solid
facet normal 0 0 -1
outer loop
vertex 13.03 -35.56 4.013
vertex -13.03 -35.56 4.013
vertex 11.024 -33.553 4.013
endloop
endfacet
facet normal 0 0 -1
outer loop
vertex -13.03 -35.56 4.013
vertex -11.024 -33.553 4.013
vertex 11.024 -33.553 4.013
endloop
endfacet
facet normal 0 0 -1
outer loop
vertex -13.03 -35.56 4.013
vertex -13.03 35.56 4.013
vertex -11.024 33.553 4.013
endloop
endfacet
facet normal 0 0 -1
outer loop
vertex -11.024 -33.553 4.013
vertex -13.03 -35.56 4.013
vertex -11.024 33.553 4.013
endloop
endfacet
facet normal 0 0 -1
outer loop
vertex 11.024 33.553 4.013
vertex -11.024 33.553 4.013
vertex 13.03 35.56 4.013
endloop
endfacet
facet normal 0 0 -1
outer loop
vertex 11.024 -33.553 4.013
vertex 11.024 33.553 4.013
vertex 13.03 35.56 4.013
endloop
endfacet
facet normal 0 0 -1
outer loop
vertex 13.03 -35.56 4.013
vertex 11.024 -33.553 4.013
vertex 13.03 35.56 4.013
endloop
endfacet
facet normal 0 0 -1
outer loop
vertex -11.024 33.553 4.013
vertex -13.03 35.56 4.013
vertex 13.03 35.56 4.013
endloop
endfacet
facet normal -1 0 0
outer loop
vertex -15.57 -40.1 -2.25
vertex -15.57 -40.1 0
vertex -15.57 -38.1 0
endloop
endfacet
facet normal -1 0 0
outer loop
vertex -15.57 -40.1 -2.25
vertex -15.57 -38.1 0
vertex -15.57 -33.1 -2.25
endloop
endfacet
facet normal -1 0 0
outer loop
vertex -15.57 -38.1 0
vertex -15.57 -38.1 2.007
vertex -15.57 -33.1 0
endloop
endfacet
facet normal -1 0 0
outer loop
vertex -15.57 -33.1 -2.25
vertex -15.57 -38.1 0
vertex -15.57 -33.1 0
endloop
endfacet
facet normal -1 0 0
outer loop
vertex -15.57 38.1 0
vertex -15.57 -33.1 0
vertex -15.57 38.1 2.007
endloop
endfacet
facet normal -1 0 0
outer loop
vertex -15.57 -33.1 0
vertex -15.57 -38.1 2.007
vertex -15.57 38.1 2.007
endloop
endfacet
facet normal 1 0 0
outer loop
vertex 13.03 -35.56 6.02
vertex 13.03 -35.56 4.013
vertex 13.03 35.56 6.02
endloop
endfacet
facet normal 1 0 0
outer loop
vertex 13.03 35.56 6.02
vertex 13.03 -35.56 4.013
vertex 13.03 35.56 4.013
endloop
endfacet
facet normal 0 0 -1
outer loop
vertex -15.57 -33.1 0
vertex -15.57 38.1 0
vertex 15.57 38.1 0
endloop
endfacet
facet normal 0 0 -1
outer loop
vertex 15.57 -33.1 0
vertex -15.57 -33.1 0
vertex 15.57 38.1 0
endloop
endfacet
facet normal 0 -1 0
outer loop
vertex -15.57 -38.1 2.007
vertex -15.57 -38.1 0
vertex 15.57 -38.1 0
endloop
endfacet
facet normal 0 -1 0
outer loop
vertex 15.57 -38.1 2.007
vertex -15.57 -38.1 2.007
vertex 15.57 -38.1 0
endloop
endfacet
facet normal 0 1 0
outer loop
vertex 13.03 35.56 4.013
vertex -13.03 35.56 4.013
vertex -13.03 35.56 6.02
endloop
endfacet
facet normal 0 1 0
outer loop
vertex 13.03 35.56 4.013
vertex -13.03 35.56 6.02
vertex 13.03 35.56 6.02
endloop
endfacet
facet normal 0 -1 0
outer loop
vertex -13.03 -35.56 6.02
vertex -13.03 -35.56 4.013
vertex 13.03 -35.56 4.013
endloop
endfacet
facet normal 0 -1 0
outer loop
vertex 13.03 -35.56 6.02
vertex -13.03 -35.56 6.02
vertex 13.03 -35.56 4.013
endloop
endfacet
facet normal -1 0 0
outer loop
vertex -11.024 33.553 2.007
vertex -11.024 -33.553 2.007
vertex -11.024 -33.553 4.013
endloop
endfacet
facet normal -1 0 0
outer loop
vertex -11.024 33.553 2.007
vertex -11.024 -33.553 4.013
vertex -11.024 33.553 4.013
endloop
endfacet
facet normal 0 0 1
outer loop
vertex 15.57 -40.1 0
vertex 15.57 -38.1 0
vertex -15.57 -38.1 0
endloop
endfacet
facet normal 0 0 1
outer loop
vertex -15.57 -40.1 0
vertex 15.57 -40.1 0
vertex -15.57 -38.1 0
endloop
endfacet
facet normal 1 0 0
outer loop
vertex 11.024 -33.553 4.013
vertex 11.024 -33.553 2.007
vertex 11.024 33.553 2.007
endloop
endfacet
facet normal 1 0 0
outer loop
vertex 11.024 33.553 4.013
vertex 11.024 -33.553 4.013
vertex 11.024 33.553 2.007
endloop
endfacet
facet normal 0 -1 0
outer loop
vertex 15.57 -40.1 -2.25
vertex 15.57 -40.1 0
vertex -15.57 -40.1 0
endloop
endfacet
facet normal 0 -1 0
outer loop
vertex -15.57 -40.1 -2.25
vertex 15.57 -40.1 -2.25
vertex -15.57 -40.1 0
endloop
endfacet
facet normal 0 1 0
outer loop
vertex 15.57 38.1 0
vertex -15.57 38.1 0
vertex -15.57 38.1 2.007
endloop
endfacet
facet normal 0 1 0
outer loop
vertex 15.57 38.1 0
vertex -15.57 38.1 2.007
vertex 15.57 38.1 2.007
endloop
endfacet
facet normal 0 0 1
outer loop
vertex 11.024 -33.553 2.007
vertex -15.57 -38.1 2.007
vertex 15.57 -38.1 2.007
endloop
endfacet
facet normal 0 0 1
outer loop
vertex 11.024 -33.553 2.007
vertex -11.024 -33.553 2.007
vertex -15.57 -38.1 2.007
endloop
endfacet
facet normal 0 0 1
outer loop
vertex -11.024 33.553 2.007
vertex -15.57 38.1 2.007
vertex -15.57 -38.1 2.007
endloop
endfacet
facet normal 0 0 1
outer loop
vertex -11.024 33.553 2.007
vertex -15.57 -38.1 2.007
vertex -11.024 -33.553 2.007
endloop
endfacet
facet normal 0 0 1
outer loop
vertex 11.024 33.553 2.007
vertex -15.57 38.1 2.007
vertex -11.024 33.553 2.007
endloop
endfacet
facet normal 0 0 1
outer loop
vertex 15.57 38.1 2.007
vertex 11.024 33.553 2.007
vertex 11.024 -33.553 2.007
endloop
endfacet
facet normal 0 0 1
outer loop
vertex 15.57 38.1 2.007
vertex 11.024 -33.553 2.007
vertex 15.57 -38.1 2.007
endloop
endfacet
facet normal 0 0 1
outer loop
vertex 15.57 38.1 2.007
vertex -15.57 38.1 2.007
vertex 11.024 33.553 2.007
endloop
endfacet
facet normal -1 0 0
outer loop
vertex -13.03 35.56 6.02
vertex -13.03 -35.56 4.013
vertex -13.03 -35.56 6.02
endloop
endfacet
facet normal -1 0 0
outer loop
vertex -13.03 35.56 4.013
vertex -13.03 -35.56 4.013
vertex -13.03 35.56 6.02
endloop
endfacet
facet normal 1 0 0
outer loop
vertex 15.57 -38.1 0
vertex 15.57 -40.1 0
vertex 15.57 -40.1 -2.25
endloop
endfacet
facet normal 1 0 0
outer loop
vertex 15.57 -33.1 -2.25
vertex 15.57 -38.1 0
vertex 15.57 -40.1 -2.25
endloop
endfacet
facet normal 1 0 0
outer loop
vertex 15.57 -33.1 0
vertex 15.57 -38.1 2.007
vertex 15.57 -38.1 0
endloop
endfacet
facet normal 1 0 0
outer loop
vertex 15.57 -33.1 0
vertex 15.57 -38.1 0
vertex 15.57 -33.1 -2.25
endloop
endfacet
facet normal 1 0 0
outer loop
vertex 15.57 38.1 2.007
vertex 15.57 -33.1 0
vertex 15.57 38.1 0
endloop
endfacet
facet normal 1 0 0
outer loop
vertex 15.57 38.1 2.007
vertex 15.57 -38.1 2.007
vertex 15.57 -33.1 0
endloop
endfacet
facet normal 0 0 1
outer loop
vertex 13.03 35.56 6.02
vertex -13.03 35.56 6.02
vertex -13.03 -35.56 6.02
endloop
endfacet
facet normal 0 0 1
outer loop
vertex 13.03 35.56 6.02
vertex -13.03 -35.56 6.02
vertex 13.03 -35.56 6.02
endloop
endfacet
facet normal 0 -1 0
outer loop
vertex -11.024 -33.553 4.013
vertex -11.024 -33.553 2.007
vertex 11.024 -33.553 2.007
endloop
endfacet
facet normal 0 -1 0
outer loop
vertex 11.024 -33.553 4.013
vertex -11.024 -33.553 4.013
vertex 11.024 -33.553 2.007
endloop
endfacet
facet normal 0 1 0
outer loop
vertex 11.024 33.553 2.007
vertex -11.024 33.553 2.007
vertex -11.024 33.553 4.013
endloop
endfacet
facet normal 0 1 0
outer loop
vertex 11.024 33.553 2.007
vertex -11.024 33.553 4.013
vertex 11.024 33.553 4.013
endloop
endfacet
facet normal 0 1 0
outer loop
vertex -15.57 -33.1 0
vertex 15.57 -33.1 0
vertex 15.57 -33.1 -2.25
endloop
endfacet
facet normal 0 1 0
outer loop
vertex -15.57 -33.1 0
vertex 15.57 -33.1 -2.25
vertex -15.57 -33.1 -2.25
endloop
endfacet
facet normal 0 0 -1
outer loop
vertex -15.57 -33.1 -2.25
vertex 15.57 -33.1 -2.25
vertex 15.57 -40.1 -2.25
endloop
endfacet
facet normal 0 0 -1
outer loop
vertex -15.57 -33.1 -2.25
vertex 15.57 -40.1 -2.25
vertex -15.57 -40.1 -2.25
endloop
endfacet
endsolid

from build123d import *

# Parameters (mm, degrees)
SKETCH2_W      = 31.1404
SKETCH2_H      = 76.2
EXTRUDE1_DEPTH = 2.0066
SKETCH3_W      = 22.0472
SKETCH3_H      = 67.1068
EXTRUDE2_DEPTH = 2.0066
SKETCH4_W      = 26.0604
SKETCH4_H      = 71.12
EXTRUDE3_DEPTH = 2.0066
SKETCH5_W      = 31.1404
SKETCH5_H      = 7
EXTRUDE4_DEPTH = 2.25


with BuildPart() as part:
    # Sketch2 → Extrude1 (new body)
    with BuildSketch(Plane.XY):
        Rectangle(SKETCH2_W, SKETCH2_H)
    extrude(amount=EXTRUDE1_DEPTH)

    # Sketch3 → Extrude2 (add)
    with BuildSketch(Plane.XY.offset(2.0066)):
        Rectangle(SKETCH3_W, SKETCH3_H)
    extrude(amount=EXTRUDE2_DEPTH)

    # Sketch4 → Extrude3 (add)
    with BuildSketch(Plane.XY.offset(4.0132)):
        Rectangle(SKETCH4_W, SKETCH4_H)
    extrude(amount=EXTRUDE3_DEPTH)

    # Sketch5 → Extrude4 (add)
    with BuildSketch(Plane(origin=(0, 0, 0), x_dir=(-1, 0, 0), z_dir=(0, 0, -1))):
        with Locations((0, -36.6)):
            Rectangle(SKETCH5_W, SKETCH5_H)
    extrude(amount=EXTRUDE4_DEPTH)


solid = part.part
